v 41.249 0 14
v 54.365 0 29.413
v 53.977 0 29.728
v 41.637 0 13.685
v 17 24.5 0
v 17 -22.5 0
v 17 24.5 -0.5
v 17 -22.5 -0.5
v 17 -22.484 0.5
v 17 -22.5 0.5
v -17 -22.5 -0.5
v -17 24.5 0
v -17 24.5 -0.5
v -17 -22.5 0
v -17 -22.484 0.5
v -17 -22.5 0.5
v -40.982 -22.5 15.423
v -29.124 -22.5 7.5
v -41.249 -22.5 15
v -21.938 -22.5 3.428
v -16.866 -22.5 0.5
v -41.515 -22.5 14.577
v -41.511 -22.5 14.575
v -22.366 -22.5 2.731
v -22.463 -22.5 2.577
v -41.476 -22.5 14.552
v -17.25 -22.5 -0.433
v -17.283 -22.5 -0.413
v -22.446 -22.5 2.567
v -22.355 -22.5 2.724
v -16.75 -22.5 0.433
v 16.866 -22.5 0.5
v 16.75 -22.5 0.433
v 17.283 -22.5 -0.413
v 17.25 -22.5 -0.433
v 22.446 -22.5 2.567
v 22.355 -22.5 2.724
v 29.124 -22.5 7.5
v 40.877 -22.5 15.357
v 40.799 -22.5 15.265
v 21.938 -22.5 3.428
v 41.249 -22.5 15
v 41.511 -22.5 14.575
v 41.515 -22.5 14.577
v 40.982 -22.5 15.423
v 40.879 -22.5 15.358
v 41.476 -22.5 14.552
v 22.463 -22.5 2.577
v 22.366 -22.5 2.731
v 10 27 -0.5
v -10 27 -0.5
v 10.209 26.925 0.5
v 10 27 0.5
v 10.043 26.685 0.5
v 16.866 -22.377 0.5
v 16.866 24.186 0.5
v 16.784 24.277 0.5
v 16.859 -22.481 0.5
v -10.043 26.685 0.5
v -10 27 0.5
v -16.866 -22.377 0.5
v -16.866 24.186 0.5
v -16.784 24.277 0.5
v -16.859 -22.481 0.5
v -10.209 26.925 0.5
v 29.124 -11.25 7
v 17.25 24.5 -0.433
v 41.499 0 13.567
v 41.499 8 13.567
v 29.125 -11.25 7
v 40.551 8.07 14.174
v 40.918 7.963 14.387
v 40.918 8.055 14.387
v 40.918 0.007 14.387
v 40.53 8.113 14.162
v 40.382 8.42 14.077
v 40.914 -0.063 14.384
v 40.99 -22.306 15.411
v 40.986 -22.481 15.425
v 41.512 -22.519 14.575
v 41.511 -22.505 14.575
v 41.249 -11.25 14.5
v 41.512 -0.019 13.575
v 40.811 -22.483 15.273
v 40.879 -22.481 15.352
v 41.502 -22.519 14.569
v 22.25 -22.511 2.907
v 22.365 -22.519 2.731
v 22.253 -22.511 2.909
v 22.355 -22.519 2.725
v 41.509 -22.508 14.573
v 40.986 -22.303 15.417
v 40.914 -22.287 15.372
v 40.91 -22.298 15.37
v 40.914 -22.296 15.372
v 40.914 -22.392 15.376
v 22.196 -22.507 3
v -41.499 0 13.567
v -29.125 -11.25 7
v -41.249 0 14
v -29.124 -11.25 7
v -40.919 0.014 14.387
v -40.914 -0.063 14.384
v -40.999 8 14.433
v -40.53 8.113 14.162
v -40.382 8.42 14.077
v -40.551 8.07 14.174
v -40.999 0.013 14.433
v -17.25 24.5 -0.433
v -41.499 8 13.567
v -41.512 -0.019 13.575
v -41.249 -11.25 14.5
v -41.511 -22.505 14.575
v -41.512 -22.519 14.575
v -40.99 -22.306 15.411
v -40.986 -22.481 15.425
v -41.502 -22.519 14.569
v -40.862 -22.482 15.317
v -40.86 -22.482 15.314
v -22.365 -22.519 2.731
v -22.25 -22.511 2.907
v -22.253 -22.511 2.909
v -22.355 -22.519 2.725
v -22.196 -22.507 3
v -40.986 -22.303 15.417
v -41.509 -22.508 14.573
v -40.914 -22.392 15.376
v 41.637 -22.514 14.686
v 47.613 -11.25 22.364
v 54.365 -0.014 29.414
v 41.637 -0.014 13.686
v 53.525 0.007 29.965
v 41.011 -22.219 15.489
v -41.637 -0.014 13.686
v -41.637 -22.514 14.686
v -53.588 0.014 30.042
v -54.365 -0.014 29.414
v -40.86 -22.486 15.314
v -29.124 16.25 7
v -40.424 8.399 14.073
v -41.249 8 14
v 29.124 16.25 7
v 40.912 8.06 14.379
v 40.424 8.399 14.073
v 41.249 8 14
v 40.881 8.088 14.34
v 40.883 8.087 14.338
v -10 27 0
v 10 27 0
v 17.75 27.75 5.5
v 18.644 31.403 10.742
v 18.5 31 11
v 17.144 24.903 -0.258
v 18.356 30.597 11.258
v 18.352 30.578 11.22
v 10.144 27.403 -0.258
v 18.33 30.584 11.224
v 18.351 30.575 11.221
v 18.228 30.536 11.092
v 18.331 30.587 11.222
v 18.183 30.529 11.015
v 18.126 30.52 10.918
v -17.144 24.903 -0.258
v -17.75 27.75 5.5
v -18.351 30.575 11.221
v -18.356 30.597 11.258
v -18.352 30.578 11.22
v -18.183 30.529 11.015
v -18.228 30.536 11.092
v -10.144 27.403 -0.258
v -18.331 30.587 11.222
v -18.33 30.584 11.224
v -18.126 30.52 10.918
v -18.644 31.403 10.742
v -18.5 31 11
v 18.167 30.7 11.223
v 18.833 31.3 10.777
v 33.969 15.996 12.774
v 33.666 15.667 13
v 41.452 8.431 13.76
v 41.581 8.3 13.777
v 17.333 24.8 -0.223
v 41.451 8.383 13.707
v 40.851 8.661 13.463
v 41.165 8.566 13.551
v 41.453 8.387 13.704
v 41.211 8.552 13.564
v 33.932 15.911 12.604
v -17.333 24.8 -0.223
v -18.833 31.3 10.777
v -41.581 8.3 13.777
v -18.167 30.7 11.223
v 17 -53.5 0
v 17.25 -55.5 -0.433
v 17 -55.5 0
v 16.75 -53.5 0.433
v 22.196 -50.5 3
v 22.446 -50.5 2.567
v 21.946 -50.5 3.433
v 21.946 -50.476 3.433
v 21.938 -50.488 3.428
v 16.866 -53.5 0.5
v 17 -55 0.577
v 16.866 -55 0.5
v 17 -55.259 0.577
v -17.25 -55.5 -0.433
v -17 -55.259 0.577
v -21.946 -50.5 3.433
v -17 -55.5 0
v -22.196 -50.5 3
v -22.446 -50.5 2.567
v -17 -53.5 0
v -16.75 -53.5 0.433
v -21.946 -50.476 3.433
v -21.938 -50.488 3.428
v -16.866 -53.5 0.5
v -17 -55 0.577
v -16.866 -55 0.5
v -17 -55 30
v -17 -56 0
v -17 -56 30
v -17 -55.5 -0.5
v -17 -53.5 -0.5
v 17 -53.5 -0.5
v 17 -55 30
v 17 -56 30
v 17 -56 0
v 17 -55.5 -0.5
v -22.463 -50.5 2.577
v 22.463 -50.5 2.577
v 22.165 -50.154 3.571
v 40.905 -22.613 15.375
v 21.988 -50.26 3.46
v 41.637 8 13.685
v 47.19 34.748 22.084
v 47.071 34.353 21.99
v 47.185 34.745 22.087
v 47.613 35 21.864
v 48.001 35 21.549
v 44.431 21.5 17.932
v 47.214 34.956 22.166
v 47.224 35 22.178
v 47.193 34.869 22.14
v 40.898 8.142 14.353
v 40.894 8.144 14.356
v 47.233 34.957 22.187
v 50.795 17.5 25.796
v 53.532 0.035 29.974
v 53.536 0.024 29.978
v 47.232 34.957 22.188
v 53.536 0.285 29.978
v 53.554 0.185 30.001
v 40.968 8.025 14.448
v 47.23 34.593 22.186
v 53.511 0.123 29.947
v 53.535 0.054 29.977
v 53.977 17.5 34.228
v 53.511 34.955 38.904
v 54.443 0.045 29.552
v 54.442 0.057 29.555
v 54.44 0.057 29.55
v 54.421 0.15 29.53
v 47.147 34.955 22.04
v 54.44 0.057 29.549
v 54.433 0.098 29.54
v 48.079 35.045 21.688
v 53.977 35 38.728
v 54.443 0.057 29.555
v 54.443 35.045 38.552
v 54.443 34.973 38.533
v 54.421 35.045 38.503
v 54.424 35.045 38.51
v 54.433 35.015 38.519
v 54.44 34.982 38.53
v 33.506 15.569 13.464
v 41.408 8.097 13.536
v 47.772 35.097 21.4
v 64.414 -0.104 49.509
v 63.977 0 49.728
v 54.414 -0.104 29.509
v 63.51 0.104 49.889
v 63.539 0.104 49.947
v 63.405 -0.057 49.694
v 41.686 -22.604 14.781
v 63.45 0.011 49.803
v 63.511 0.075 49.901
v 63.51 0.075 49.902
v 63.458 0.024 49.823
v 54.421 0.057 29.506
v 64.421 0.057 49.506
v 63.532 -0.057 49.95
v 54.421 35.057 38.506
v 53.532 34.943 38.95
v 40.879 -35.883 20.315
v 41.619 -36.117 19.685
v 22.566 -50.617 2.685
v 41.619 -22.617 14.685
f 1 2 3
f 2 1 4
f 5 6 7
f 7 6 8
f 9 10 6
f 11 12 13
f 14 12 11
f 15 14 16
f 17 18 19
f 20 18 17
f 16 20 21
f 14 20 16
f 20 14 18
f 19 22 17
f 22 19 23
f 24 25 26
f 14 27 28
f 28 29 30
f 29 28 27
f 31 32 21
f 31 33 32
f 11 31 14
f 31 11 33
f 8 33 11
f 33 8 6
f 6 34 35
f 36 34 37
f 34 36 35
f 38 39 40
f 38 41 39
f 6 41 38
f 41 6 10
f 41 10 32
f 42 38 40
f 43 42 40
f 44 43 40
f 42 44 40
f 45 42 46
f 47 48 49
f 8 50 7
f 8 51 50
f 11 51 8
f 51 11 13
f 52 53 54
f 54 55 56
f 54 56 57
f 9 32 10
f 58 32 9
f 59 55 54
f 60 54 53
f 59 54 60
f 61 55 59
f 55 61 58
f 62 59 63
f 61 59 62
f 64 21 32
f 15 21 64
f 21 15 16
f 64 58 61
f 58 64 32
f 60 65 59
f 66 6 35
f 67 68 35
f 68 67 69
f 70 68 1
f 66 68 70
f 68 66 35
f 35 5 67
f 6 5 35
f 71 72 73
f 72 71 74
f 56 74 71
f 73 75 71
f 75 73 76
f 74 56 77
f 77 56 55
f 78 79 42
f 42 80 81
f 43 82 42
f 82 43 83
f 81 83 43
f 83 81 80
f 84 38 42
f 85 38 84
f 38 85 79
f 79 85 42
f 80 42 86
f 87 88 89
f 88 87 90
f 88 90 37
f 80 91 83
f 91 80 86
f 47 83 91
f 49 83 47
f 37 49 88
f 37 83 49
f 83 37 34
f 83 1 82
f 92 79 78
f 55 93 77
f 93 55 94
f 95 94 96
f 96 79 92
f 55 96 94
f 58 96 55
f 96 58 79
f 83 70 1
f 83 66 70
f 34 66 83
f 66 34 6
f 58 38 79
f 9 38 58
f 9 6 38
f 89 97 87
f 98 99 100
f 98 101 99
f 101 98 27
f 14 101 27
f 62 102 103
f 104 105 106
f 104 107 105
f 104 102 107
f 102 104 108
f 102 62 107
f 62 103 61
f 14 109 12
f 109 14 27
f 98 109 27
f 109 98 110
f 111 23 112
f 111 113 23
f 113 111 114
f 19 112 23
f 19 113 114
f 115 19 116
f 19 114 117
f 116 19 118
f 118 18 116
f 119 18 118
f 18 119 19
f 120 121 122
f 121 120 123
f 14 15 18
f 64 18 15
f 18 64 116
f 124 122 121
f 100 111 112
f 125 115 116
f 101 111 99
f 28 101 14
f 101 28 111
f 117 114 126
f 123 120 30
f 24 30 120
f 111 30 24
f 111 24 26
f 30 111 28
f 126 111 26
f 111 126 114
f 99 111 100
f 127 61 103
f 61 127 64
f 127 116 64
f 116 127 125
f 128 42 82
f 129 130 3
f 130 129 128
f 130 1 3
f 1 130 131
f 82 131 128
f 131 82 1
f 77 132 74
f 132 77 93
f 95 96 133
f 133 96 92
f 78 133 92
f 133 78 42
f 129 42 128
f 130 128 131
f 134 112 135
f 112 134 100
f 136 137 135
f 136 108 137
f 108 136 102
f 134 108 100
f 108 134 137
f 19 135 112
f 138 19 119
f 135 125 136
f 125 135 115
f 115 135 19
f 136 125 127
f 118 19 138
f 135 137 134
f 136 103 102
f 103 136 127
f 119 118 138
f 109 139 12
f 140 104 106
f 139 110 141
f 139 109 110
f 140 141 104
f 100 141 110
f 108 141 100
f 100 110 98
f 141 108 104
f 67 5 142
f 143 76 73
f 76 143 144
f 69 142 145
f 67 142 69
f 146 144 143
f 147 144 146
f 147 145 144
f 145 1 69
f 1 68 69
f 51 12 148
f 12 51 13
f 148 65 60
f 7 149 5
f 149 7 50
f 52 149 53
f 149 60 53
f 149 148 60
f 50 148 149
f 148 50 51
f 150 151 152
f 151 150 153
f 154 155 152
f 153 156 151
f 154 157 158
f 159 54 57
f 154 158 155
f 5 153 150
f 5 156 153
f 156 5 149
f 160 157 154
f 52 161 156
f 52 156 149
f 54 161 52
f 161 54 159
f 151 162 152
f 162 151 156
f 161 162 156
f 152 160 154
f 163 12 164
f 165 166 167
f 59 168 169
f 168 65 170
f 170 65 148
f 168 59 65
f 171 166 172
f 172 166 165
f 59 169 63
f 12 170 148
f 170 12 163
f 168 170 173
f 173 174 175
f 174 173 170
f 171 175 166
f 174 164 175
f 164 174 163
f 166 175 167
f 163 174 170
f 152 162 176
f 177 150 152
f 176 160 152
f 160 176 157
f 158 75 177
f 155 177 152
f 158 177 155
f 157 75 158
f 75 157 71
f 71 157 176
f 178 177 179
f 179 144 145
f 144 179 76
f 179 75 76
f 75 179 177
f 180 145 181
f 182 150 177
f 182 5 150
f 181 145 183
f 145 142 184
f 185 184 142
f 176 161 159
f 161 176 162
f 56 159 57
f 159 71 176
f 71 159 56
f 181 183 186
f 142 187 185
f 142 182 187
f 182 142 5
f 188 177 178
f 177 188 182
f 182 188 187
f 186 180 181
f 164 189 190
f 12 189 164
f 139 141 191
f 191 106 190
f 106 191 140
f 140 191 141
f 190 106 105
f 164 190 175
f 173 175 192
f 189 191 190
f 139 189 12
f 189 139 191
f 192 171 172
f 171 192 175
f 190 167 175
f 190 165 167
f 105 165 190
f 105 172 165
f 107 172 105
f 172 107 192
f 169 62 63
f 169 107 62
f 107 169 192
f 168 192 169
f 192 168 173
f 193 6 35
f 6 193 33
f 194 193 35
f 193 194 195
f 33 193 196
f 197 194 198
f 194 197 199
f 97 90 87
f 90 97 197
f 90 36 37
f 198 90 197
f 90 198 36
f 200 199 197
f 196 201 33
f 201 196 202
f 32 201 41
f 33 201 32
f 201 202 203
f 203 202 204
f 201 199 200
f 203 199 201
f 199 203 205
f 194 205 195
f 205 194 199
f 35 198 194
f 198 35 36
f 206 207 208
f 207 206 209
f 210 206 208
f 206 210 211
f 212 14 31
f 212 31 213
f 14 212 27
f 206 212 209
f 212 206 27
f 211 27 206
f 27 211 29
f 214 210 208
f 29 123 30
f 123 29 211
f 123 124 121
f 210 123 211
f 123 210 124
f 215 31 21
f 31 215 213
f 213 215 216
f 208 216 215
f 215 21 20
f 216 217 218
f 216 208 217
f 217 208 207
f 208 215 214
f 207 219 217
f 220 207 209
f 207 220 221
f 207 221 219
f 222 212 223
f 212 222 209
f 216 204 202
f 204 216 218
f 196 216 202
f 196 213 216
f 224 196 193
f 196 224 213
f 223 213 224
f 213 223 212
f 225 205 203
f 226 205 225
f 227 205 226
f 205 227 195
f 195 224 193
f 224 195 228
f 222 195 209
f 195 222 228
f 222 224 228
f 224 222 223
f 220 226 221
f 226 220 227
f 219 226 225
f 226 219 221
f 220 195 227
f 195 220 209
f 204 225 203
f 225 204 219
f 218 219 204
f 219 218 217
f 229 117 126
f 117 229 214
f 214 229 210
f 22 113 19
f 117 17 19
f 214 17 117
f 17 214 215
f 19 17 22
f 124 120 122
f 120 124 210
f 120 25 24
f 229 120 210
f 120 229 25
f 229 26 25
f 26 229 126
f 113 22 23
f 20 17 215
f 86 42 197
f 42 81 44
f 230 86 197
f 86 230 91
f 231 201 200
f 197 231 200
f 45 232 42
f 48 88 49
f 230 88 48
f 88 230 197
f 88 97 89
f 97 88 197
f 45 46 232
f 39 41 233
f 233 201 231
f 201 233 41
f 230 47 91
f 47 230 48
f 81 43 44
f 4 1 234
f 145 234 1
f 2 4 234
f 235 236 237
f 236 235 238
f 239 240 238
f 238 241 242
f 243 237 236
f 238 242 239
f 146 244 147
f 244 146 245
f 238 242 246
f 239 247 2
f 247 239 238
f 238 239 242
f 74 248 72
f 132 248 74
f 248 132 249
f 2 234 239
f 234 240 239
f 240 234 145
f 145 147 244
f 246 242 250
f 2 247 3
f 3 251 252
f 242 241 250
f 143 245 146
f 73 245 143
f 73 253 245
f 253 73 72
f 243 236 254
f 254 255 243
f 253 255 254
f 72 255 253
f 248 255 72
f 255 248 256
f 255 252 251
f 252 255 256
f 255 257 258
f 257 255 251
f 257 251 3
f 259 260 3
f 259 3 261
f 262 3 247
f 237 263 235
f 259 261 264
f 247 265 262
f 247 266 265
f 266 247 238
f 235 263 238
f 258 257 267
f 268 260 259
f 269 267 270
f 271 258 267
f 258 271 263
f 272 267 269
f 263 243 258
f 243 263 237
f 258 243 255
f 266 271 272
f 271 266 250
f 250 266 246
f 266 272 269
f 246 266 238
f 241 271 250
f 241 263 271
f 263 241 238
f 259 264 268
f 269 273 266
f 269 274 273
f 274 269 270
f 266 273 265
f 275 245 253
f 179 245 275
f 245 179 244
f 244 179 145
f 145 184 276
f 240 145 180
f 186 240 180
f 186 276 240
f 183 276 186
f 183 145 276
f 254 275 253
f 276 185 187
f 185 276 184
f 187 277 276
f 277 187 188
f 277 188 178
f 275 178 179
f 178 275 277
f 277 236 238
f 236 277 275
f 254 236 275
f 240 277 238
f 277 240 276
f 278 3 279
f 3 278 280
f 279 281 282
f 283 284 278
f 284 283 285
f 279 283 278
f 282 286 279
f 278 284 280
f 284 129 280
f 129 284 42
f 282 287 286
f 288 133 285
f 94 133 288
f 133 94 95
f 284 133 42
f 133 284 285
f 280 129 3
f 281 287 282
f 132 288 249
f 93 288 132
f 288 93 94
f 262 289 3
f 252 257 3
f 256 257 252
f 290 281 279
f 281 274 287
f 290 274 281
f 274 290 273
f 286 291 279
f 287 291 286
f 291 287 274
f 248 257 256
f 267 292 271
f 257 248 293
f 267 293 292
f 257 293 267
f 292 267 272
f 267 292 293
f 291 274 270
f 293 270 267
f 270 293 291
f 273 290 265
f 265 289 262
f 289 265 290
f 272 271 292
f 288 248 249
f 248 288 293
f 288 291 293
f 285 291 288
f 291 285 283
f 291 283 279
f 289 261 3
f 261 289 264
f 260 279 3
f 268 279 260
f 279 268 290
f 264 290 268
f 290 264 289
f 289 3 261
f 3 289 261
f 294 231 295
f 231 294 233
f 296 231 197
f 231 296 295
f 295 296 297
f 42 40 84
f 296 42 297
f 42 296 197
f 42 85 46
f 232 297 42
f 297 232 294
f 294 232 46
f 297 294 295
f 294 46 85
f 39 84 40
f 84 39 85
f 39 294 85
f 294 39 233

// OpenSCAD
// file: funciones_puntos.scad
function vector(p1, p2) = [p2[0] - p1[0], p2[1] - p1[1], p2[2] - p1[2]];

function rotar_punto(p, respecto_a, grados) = 
    let(q = vector(p, respecto_a), m = norm(q)) 
        respecto_a + [m * cos(grados), 0, m * sin(grados)];

function producto_escalar(u, v) = [u[1] * v[2] - u[2] * v[1], - u[0] * v[2] + u[2] * v[0], u[0] * v[1] - u[1] * v[0]];

module lado(vertices, offcentro = 0, grosor_lado = 1) {
    n_vertices = len(vertices);
    punto_medio = punto_medio(vertices);
    
    //vertice(punto_medio);
    
    off_vertices = [    
        for (i=[0:n_vertices - 1])
            let (vector = vector(punto_medio, vertices[i]))
                vertices[i] + vector * offcentro / norm(vector)
    ];
        
    //vertices(off_vertices);
        
    u = vector(off_vertices[1], off_vertices[0]);
    v = vector(off_vertices[2], off_vertices[0]);
        
    //dibujar_vector(off_vertices[1], off_vertices[0]);
    //dibujar_vector(off_vertices[2], off_vertices[0]);
        
    producto_escalar = producto_escalar(u, v);
        
    //dibujar_vector(punto_medio, producto_escalar);
        
    incremento = grosor_lado * producto_escalar / (2 * norm(producto_escalar));
    
    vertices_pol = [
        for (i = [0:2 * n_vertices - 1])
            i < n_vertices
                ? off_vertices[i]              - incremento
                : off_vertices[i - n_vertices] + incremento
    ];
        
    caras_pol = [
        for (i = [0:n_vertices - 1])
            [i, n_vertices + i, n_vertices + (i+1) % n_vertices, (i+1) % n_vertices]
    ];
        
    caras_pol2 = [
        [for (i=[0:n_vertices - 1]) i],
        [for (i=[0:n_vertices - 1]) 2 * n_vertices - i - 1]
    ];
    
    polyhedron(
        vertices_pol, 
        concat(caras_pol, caras_pol2)
    );
}

function punto_medio(vertices, i, n_vertices) = 
    n_vertices == undef 
        ? (
            len(vertices) == 0 
                ? undef 
                : punto_medio(vertices, 0, len(vertices))
        ) 
        : (
            i == n_vertices 
                ? [0, 0, 0] 
                : (vertices[i] / n_vertices) + punto_medio(vertices, i + 1, n_vertices)
        );

function punto_medio_2(u, v) = (u + v) / 2;

function suma_lista(lista, l = -1) = 
    l == -1 
        ? (
            len(lista) == 1 
                ? lista[0] 
                : lista[len(lista) - 1] + suma_lista(lista, len(lista) - 2)
        ) 
        : (
            l == 0 
                ? lista[0] 
                : lista[l] + suma_lista(lista, l - 1)
        );

module vertice(p, diametro = 1) {
    translate(p) sphere(d = diametro);
}

module vertices(vertices, diametro = 1) {
    for (i = [0:len(vertices) - 1]) {
        vertice(vertices[i]);
    }
}

module arista(a, b, diametro = 1) {
    vector = vector(a, b);
    
    translate(punto_medio_2(a, b))
        rotate(angulos_vector(vector))
            cylinder(norm(vector), d=diametro, center=true);
}

function angulos_vector(v) = 
    v[0] != 0
    ? [
        0,
        v[0] > 0 ? acos(v[2]/norm(v)) : 360 - acos(v[2]/norm(v)),
        atan(v[1] / v[0])
    ]
    : (
        v[1] != 0
        ? [v[2] == 0 ? (/* Punto sobre el eje y */ v[1] < 0 ? 90 : 270 ) : (v[1] > 0 ? -90 : 90) + atan(v[2] / v[1]), 0, 0]
        : (
            v[2] == 0 // Es un punto en el eje z, y como ya estaba en el eje z no hay que hacer nada
                ? undef 
                : [v[2] > 0 ? 0 : 180, 0, 0]
        )
    );

module dibujar_vector(a, b, diametro = 1, diametro_cono = 2.5) {
    ratio          = 0.8;
    vector         = vector(a, b);
    punto_division = a + vector * ratio;
    
    arista(a, punto_division, diametro); 
    //vertices([a, b]);
    
    translate(punto_medio_2(punto_division, b))
        rotate(angulos_vector(vector))
            cylinder(norm(vector) * (1 - ratio), d1=diametro_cono, d2=0, center=true);
}

module esfera_en_punto(punto, diametro) {
    translate(punto) sphere(d=diametro);   
}

module recta_por_punto(punto, vector) {
    translate(punto)
        rotate(angulos_vector(vector))
            cylinder(h=500, d=1, center=true);
}
// main file
$fn = 20;

use <funciones_puntos.scad>

diametro_vertice = 2;
diametro_arista  = diametro_vertice;
grosor_lado      = 1;
tamano_texto     = 3;
separacion_texto = 0.25;
offcentro        = 0; // La cantidad que se aniade a cada lado para que solape con los de al lado

// Cuadrado inicial
p1  = [-17,     0,  0];
p2  = [ 17,     0,  0];
p3  = [-17, -22.5,  0];
p4  = [ 17, -22.5,  0];

// Dentro boca
p5  = [-17,     0, 19]; 
p6  = [ 17,     0, 19];

// Laterales cuadrado inicial. 28 mm a 150 grados
p7  = rotar_punto(p2 + [ 28, 0, 0], p2, 30);
p8  = rotar_punto(p4 + [ 28, 0, 0], p4, 30) + [0, 0, 1];
p9  = rotar_punto(p1 + [-28, 0, 0], p1, 180 - 30);
p10 = rotar_punto(p3 + [-28, 0, 0], p3, 180 - 30) + [0, 0, 1];

// Bigote
p11 = p7 + [0, 8, 0];
p12 = p2 + [0, 24.5, 0];
p13 = p9 + [0, 8, 0];
p14 = p1 + [0, 24.5, 0];

// 
p15 = rotar_punto(p7 + [18, 0, 0], p7, 45) + [0, 0, 3];
p30 = rotar_punto(p9 + [18, 0, 0], p9, 180 - 45) + [0, 0, 3];

// Barbilla
p16 = rotar_punto(p4 + [6, 0, 0], p4, 30);
p17 = p4  + [0, -33, 0];
p18 = p16 + [0, -28, 0];
p19 = rotar_punto(p3 + [-6, 0, 0], p3, 180 - 30);
p20 = p3  + [0, -33, 0];
p21 = p19 + [0, -28, 0];
p22 = p20 + [0, 2, 0];
p23 = p17 + [0, 2, 0];
p24 = p20 + [0, 0, 30];
p25 = p17 + [0, 0, 30];

p26 = p12 + [ 1.5, 6.5, 11];
p27 = p14 + [-1.5, 6.5, 11];
p28 = p12 + [  -7, 2.5,  0];
p29 = p14 + [   7, 2.5,  0];

// Patillas
p31 = [83.93 , 52.93 , 64.38];
p32 = p31 + [0,   0, 30];
p33 = p32 + [0, -34, 0];
p34 = [-83.93 , 52.93 , 64.38];
p35 = p34 + [0,   0, 30];
p36 = p35 + [0, -34, 0];

// Lateral derecho

p37 = p15 + [0, 35, 9];
p38 = (p15 + p7) / 2 + [0, 35, 0];
p39 = vector(p11, p26) / 3 + p11;
p40 = p15 + [10, 0, 20];
p41 = (p37 + p31) / 2 + [0, 0, -3];

// Lateral derecho barbilla
p42 = p8 + [0, -13.5, 5];


p = [[], p1, p2, p3, p4, p5, p6, p7, p8, p9, p10, p11, p12, p13, p14, p15, p16, p17, p18, p19, p20, p21, p22, p23, p24, p25, p26, p27, p28, p29, p30, p31, p32, p33, p34, p35, p36, p37, p38, p39, p40, p41, p42];

difference() {
    union () {
        // Cuadrado inicial
        lado_n([1, 2, 4, 3]);

        // Soporte boca
        //lado_n([1, 2, 6, 5]);

        // Laterales cuadrado inicial
        lado_n([2, 7,  4]); 
        lado_n([7,  8, 4]); 
        lado_n([1, 9, 3]); 
        lado_n([9, 10, 3]); 
        lado_n([7, 8, 15]);
        lado_n([10, 9, 30]);

        // Bigote
        lado_n([9, 13, 14, 1]);
        lado_n([14, 12, 2, 1]);
        lado_n([2, 12, 11, 7]);

        // Debajo nariz
        lado_n([14, 29, 28, 12]);
        lado_n([12, 26, 28]);
        lado_n([14, 29, 27]);
        lado_n([12, 26, 11]);
        lado_n([27, 14, 13]);

        // Barbilla
        lado_n([4, 16, 18, 17]);
        lado_n([3, 20, 21, 19]);
        lado_n([20, 22, 23, 17]);
        lado_n([20, 24, 25, 17]); // Limite inferior
        lado_n([10, 19, 21]);
        lado_n([18, 8, 16]);
        
        // Lateral derecho
        lado_n([7, 11, 38, 15]);
        lado_n([37, 15, 38]);
        lado_n([39, 11, 38]);
        lado_n([15, 40, 8]);
        lado_n([37, 15, 40]);
        
        // Lateral derecho barbilla
        lado_n([42, 18, 8]);
    }
    translate([0, 0, -5.51]) cube([300, 300, 10], true);
    //translate([-150 + 15, 0]) cube(300, true);
}



for (i = [1:len(p) - 1]) {
    %texto_en_coordenada(i);
}

module lado_n(numeros) {
    n_vertices = len(numeros);
    
    lado([ for(i = [0:n_vertices - 1]) p[numeros[i]] ], offcentro, grosor_lado);
        
    /*for(i = [0:n_vertices - 1]) {
        arista(p[numeros[i]], p[numeros[(i + 1) % n_vertices]], diametro_arista);
        vertice(p[numeros[i]], diametro_vertice);
    }*/
}

module texto_en_coordenada(c) {
    translate([p[c][0] + separacion_texto, p[c][1] + separacion_texto, p[c][2]])
        rotate([5, 0])
            linear_extrude(4)
                text(str(c), tamano_texto);
}
